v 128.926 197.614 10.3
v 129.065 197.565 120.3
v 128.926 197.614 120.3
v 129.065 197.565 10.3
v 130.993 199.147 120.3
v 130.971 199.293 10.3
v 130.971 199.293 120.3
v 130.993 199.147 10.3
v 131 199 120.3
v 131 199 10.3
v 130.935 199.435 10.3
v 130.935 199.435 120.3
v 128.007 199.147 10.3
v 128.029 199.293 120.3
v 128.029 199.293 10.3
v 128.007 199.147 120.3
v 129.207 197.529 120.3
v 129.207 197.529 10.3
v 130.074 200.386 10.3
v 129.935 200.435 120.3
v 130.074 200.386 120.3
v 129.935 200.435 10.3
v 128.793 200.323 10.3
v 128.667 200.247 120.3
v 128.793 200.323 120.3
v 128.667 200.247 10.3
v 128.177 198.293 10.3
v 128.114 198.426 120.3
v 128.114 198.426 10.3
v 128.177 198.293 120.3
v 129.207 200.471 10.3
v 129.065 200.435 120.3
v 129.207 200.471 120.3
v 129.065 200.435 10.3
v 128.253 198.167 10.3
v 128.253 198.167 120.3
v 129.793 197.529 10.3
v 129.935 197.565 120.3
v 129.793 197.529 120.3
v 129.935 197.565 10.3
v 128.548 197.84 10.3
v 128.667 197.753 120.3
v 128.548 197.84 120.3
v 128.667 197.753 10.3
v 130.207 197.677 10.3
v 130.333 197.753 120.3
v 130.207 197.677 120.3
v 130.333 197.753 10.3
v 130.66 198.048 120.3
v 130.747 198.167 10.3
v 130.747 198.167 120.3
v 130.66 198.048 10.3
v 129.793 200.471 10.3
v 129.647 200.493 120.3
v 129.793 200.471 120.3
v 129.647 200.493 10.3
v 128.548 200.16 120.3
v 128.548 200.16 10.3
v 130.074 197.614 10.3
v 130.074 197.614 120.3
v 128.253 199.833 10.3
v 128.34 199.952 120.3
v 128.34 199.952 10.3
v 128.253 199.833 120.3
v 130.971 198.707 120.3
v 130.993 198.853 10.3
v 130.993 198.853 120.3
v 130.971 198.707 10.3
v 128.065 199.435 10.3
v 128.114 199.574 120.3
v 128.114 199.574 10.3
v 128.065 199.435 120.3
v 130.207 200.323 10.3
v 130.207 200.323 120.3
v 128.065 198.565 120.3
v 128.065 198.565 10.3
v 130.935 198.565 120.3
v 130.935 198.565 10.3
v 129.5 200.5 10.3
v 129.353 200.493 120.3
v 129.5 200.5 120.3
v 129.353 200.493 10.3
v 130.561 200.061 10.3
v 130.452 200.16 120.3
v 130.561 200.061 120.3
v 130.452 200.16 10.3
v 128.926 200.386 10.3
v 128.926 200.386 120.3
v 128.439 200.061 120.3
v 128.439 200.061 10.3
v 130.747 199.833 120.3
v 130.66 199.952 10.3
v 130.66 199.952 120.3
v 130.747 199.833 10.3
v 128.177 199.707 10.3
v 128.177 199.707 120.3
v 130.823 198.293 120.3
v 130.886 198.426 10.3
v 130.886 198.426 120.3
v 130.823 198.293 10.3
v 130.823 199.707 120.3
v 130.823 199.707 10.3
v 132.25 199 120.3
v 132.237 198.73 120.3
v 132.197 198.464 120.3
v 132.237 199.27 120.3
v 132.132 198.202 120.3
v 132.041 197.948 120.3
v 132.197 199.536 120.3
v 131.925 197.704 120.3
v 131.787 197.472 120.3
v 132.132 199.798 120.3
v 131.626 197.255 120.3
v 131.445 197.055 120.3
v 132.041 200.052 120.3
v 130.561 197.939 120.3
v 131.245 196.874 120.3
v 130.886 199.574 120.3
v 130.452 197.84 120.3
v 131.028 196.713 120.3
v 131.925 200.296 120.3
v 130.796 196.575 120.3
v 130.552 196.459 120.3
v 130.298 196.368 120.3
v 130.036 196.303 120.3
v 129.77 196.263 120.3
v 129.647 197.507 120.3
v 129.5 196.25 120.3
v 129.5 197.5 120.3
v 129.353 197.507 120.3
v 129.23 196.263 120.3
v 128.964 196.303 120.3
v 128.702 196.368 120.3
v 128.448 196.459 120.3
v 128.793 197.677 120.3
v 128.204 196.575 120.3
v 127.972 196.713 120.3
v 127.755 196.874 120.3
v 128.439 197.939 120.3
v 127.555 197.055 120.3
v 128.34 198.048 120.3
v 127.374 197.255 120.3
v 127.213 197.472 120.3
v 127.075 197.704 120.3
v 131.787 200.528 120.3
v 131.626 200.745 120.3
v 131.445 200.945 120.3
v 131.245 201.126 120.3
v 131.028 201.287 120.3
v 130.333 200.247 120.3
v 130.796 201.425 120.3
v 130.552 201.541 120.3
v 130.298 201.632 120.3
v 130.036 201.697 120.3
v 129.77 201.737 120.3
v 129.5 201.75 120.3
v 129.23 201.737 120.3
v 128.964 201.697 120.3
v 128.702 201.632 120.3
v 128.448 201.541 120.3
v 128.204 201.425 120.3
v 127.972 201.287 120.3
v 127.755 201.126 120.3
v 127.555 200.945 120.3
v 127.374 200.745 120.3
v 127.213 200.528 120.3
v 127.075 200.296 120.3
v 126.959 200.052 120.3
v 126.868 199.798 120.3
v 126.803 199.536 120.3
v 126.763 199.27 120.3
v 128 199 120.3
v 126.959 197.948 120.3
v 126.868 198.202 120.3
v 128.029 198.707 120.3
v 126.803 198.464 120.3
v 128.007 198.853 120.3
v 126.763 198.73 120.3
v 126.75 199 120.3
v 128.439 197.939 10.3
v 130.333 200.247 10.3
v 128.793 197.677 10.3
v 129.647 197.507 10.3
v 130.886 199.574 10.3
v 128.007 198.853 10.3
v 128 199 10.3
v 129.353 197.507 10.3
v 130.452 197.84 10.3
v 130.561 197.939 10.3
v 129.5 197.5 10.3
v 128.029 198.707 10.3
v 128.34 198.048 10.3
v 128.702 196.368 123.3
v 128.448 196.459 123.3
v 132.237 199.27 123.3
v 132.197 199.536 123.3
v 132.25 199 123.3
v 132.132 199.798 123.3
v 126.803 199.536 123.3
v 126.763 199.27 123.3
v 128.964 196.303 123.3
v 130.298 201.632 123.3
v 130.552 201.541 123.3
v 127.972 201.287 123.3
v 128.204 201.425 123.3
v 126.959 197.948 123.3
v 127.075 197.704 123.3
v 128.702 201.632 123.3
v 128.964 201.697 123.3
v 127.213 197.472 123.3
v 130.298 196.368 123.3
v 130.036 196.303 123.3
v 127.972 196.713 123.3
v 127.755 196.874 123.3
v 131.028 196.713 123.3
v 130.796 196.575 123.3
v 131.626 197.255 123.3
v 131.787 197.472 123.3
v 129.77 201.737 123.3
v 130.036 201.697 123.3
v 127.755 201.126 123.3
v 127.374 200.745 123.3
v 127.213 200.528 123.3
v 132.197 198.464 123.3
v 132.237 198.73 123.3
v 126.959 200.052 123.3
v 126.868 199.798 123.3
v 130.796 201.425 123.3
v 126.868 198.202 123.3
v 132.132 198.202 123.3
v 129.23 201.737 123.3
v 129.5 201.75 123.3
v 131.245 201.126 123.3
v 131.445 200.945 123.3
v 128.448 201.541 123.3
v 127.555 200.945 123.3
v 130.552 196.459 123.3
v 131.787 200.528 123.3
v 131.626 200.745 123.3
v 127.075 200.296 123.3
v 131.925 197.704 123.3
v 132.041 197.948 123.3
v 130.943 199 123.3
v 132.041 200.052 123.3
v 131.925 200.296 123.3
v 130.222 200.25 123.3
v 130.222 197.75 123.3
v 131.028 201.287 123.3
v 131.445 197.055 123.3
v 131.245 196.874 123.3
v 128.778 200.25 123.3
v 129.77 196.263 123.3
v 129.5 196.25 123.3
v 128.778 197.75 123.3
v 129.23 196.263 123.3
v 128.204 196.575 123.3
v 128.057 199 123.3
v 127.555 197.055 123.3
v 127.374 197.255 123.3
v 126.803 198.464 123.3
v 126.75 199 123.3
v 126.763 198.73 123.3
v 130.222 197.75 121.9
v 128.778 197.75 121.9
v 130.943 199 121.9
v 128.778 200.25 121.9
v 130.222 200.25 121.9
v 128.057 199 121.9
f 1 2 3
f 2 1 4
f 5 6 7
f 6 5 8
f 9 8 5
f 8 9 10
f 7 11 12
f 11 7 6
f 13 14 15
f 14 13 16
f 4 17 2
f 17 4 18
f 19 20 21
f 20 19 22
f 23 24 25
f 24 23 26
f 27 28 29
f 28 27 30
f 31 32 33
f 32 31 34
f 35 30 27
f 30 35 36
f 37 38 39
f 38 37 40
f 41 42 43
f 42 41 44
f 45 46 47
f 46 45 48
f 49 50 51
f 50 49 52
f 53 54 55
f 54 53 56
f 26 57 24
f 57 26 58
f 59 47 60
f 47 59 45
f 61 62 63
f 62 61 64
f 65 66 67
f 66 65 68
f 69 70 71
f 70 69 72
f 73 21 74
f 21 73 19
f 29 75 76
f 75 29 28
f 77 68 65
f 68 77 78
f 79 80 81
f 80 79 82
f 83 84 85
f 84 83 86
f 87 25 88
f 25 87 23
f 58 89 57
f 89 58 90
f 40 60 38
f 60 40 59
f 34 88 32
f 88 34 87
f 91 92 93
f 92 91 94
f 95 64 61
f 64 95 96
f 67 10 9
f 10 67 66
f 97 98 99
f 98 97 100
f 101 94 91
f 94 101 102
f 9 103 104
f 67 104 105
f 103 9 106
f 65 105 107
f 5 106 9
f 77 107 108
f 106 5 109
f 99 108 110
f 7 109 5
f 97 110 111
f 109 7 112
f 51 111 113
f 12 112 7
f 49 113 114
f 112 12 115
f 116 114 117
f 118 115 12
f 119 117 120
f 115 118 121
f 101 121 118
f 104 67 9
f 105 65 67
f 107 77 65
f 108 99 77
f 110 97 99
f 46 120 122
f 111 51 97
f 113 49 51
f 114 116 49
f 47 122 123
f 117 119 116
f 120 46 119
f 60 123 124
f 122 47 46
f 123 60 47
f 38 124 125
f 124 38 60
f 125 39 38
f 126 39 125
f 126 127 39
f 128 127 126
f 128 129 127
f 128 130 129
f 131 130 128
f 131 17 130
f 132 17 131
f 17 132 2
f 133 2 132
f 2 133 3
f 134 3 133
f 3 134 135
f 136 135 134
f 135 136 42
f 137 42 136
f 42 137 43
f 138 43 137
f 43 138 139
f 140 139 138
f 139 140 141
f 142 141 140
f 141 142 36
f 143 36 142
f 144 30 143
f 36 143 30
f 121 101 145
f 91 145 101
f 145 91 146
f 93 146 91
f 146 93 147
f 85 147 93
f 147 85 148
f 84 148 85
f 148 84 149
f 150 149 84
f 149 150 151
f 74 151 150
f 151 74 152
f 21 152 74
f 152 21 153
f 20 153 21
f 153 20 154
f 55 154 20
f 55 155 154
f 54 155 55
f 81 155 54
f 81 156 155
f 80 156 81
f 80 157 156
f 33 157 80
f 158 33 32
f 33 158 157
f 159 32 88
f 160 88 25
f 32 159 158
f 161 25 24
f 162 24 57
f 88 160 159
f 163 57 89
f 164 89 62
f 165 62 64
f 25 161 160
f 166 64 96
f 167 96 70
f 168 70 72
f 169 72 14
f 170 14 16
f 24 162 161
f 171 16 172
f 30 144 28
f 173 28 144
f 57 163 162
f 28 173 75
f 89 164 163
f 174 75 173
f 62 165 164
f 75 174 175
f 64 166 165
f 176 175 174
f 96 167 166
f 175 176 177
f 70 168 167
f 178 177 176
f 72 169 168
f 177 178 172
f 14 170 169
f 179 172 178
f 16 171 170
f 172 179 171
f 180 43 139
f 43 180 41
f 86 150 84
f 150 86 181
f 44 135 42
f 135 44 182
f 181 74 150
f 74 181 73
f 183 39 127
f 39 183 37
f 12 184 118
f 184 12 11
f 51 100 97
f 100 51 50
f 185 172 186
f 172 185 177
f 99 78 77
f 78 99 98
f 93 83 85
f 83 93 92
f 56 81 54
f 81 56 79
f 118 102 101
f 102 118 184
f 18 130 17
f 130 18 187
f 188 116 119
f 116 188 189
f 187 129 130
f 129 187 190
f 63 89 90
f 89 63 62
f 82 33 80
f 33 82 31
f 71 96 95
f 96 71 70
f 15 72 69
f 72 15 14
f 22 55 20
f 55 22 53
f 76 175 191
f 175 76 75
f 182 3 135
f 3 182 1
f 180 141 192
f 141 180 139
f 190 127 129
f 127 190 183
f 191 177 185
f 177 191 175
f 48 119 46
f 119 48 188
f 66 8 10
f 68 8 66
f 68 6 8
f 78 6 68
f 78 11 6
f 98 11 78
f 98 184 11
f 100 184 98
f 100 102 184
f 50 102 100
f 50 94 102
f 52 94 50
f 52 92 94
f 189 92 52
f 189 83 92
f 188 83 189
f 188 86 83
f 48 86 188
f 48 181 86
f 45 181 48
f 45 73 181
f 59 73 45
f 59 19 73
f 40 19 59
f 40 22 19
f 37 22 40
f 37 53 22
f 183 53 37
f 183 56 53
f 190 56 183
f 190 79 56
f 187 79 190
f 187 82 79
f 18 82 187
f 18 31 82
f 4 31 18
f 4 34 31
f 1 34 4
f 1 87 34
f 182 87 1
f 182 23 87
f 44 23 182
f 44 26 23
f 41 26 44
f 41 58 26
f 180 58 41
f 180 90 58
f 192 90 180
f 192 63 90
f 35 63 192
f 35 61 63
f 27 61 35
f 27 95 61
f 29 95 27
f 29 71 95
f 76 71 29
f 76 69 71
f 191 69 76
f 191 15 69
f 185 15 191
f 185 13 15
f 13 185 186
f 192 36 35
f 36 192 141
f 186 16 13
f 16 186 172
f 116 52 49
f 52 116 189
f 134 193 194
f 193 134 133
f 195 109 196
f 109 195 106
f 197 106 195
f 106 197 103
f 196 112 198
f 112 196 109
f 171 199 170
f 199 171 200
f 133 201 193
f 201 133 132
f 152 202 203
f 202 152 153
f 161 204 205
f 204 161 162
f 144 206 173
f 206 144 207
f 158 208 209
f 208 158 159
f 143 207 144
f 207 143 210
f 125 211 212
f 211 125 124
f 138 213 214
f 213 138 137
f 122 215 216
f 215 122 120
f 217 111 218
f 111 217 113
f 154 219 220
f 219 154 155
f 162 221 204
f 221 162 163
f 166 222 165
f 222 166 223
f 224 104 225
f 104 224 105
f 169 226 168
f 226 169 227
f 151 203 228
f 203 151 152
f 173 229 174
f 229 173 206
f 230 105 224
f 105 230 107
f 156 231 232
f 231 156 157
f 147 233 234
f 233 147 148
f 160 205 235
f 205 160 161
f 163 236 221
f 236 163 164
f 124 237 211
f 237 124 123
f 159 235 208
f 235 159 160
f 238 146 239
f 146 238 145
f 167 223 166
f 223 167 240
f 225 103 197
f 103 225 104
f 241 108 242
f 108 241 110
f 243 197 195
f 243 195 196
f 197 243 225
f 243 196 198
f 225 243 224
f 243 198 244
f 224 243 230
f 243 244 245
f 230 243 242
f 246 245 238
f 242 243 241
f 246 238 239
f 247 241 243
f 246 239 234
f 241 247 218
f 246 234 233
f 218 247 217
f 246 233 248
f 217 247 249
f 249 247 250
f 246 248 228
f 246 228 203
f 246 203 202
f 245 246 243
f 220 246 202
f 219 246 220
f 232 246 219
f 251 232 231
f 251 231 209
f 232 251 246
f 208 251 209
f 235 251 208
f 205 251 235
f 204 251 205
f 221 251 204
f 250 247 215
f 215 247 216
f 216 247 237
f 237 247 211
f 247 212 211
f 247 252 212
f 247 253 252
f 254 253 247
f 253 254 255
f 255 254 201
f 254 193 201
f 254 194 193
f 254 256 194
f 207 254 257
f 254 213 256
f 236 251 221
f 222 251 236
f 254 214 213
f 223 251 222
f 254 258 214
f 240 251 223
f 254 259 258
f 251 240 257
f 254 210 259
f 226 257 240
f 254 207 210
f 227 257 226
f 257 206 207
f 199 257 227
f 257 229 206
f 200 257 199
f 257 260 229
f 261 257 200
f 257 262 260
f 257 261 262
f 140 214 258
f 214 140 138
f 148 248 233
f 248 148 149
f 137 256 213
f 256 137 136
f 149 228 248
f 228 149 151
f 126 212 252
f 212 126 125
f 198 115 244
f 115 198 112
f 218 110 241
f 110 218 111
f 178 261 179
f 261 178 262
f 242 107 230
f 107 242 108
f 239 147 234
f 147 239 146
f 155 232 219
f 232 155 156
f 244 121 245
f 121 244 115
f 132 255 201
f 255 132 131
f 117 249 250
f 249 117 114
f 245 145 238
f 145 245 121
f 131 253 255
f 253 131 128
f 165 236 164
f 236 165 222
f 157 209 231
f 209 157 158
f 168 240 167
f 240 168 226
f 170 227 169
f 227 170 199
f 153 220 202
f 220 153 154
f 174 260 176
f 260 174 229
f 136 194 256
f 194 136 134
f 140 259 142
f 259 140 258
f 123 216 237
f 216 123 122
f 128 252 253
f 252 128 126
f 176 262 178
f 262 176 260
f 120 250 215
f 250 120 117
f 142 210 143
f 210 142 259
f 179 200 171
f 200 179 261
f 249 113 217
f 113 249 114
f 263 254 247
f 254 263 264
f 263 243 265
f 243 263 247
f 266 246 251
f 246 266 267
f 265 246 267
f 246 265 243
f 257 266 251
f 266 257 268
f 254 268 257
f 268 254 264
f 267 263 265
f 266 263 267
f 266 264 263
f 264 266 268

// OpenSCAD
// Generated from the same CSG operations as STEP. Rebuild with spec/build_parent_hand_service.py.
difference(){union(){translate([129.5,199,10.3]) cylinder(r=1.5,h=110,$fn=64);translate([129.5,199,120.3]) cylinder(r=2.75,h=3,$fn=64);}translate([129.5,199,121.9]) cylinder(r=1.4433756729740643,h=1.5,$fn=6);}
